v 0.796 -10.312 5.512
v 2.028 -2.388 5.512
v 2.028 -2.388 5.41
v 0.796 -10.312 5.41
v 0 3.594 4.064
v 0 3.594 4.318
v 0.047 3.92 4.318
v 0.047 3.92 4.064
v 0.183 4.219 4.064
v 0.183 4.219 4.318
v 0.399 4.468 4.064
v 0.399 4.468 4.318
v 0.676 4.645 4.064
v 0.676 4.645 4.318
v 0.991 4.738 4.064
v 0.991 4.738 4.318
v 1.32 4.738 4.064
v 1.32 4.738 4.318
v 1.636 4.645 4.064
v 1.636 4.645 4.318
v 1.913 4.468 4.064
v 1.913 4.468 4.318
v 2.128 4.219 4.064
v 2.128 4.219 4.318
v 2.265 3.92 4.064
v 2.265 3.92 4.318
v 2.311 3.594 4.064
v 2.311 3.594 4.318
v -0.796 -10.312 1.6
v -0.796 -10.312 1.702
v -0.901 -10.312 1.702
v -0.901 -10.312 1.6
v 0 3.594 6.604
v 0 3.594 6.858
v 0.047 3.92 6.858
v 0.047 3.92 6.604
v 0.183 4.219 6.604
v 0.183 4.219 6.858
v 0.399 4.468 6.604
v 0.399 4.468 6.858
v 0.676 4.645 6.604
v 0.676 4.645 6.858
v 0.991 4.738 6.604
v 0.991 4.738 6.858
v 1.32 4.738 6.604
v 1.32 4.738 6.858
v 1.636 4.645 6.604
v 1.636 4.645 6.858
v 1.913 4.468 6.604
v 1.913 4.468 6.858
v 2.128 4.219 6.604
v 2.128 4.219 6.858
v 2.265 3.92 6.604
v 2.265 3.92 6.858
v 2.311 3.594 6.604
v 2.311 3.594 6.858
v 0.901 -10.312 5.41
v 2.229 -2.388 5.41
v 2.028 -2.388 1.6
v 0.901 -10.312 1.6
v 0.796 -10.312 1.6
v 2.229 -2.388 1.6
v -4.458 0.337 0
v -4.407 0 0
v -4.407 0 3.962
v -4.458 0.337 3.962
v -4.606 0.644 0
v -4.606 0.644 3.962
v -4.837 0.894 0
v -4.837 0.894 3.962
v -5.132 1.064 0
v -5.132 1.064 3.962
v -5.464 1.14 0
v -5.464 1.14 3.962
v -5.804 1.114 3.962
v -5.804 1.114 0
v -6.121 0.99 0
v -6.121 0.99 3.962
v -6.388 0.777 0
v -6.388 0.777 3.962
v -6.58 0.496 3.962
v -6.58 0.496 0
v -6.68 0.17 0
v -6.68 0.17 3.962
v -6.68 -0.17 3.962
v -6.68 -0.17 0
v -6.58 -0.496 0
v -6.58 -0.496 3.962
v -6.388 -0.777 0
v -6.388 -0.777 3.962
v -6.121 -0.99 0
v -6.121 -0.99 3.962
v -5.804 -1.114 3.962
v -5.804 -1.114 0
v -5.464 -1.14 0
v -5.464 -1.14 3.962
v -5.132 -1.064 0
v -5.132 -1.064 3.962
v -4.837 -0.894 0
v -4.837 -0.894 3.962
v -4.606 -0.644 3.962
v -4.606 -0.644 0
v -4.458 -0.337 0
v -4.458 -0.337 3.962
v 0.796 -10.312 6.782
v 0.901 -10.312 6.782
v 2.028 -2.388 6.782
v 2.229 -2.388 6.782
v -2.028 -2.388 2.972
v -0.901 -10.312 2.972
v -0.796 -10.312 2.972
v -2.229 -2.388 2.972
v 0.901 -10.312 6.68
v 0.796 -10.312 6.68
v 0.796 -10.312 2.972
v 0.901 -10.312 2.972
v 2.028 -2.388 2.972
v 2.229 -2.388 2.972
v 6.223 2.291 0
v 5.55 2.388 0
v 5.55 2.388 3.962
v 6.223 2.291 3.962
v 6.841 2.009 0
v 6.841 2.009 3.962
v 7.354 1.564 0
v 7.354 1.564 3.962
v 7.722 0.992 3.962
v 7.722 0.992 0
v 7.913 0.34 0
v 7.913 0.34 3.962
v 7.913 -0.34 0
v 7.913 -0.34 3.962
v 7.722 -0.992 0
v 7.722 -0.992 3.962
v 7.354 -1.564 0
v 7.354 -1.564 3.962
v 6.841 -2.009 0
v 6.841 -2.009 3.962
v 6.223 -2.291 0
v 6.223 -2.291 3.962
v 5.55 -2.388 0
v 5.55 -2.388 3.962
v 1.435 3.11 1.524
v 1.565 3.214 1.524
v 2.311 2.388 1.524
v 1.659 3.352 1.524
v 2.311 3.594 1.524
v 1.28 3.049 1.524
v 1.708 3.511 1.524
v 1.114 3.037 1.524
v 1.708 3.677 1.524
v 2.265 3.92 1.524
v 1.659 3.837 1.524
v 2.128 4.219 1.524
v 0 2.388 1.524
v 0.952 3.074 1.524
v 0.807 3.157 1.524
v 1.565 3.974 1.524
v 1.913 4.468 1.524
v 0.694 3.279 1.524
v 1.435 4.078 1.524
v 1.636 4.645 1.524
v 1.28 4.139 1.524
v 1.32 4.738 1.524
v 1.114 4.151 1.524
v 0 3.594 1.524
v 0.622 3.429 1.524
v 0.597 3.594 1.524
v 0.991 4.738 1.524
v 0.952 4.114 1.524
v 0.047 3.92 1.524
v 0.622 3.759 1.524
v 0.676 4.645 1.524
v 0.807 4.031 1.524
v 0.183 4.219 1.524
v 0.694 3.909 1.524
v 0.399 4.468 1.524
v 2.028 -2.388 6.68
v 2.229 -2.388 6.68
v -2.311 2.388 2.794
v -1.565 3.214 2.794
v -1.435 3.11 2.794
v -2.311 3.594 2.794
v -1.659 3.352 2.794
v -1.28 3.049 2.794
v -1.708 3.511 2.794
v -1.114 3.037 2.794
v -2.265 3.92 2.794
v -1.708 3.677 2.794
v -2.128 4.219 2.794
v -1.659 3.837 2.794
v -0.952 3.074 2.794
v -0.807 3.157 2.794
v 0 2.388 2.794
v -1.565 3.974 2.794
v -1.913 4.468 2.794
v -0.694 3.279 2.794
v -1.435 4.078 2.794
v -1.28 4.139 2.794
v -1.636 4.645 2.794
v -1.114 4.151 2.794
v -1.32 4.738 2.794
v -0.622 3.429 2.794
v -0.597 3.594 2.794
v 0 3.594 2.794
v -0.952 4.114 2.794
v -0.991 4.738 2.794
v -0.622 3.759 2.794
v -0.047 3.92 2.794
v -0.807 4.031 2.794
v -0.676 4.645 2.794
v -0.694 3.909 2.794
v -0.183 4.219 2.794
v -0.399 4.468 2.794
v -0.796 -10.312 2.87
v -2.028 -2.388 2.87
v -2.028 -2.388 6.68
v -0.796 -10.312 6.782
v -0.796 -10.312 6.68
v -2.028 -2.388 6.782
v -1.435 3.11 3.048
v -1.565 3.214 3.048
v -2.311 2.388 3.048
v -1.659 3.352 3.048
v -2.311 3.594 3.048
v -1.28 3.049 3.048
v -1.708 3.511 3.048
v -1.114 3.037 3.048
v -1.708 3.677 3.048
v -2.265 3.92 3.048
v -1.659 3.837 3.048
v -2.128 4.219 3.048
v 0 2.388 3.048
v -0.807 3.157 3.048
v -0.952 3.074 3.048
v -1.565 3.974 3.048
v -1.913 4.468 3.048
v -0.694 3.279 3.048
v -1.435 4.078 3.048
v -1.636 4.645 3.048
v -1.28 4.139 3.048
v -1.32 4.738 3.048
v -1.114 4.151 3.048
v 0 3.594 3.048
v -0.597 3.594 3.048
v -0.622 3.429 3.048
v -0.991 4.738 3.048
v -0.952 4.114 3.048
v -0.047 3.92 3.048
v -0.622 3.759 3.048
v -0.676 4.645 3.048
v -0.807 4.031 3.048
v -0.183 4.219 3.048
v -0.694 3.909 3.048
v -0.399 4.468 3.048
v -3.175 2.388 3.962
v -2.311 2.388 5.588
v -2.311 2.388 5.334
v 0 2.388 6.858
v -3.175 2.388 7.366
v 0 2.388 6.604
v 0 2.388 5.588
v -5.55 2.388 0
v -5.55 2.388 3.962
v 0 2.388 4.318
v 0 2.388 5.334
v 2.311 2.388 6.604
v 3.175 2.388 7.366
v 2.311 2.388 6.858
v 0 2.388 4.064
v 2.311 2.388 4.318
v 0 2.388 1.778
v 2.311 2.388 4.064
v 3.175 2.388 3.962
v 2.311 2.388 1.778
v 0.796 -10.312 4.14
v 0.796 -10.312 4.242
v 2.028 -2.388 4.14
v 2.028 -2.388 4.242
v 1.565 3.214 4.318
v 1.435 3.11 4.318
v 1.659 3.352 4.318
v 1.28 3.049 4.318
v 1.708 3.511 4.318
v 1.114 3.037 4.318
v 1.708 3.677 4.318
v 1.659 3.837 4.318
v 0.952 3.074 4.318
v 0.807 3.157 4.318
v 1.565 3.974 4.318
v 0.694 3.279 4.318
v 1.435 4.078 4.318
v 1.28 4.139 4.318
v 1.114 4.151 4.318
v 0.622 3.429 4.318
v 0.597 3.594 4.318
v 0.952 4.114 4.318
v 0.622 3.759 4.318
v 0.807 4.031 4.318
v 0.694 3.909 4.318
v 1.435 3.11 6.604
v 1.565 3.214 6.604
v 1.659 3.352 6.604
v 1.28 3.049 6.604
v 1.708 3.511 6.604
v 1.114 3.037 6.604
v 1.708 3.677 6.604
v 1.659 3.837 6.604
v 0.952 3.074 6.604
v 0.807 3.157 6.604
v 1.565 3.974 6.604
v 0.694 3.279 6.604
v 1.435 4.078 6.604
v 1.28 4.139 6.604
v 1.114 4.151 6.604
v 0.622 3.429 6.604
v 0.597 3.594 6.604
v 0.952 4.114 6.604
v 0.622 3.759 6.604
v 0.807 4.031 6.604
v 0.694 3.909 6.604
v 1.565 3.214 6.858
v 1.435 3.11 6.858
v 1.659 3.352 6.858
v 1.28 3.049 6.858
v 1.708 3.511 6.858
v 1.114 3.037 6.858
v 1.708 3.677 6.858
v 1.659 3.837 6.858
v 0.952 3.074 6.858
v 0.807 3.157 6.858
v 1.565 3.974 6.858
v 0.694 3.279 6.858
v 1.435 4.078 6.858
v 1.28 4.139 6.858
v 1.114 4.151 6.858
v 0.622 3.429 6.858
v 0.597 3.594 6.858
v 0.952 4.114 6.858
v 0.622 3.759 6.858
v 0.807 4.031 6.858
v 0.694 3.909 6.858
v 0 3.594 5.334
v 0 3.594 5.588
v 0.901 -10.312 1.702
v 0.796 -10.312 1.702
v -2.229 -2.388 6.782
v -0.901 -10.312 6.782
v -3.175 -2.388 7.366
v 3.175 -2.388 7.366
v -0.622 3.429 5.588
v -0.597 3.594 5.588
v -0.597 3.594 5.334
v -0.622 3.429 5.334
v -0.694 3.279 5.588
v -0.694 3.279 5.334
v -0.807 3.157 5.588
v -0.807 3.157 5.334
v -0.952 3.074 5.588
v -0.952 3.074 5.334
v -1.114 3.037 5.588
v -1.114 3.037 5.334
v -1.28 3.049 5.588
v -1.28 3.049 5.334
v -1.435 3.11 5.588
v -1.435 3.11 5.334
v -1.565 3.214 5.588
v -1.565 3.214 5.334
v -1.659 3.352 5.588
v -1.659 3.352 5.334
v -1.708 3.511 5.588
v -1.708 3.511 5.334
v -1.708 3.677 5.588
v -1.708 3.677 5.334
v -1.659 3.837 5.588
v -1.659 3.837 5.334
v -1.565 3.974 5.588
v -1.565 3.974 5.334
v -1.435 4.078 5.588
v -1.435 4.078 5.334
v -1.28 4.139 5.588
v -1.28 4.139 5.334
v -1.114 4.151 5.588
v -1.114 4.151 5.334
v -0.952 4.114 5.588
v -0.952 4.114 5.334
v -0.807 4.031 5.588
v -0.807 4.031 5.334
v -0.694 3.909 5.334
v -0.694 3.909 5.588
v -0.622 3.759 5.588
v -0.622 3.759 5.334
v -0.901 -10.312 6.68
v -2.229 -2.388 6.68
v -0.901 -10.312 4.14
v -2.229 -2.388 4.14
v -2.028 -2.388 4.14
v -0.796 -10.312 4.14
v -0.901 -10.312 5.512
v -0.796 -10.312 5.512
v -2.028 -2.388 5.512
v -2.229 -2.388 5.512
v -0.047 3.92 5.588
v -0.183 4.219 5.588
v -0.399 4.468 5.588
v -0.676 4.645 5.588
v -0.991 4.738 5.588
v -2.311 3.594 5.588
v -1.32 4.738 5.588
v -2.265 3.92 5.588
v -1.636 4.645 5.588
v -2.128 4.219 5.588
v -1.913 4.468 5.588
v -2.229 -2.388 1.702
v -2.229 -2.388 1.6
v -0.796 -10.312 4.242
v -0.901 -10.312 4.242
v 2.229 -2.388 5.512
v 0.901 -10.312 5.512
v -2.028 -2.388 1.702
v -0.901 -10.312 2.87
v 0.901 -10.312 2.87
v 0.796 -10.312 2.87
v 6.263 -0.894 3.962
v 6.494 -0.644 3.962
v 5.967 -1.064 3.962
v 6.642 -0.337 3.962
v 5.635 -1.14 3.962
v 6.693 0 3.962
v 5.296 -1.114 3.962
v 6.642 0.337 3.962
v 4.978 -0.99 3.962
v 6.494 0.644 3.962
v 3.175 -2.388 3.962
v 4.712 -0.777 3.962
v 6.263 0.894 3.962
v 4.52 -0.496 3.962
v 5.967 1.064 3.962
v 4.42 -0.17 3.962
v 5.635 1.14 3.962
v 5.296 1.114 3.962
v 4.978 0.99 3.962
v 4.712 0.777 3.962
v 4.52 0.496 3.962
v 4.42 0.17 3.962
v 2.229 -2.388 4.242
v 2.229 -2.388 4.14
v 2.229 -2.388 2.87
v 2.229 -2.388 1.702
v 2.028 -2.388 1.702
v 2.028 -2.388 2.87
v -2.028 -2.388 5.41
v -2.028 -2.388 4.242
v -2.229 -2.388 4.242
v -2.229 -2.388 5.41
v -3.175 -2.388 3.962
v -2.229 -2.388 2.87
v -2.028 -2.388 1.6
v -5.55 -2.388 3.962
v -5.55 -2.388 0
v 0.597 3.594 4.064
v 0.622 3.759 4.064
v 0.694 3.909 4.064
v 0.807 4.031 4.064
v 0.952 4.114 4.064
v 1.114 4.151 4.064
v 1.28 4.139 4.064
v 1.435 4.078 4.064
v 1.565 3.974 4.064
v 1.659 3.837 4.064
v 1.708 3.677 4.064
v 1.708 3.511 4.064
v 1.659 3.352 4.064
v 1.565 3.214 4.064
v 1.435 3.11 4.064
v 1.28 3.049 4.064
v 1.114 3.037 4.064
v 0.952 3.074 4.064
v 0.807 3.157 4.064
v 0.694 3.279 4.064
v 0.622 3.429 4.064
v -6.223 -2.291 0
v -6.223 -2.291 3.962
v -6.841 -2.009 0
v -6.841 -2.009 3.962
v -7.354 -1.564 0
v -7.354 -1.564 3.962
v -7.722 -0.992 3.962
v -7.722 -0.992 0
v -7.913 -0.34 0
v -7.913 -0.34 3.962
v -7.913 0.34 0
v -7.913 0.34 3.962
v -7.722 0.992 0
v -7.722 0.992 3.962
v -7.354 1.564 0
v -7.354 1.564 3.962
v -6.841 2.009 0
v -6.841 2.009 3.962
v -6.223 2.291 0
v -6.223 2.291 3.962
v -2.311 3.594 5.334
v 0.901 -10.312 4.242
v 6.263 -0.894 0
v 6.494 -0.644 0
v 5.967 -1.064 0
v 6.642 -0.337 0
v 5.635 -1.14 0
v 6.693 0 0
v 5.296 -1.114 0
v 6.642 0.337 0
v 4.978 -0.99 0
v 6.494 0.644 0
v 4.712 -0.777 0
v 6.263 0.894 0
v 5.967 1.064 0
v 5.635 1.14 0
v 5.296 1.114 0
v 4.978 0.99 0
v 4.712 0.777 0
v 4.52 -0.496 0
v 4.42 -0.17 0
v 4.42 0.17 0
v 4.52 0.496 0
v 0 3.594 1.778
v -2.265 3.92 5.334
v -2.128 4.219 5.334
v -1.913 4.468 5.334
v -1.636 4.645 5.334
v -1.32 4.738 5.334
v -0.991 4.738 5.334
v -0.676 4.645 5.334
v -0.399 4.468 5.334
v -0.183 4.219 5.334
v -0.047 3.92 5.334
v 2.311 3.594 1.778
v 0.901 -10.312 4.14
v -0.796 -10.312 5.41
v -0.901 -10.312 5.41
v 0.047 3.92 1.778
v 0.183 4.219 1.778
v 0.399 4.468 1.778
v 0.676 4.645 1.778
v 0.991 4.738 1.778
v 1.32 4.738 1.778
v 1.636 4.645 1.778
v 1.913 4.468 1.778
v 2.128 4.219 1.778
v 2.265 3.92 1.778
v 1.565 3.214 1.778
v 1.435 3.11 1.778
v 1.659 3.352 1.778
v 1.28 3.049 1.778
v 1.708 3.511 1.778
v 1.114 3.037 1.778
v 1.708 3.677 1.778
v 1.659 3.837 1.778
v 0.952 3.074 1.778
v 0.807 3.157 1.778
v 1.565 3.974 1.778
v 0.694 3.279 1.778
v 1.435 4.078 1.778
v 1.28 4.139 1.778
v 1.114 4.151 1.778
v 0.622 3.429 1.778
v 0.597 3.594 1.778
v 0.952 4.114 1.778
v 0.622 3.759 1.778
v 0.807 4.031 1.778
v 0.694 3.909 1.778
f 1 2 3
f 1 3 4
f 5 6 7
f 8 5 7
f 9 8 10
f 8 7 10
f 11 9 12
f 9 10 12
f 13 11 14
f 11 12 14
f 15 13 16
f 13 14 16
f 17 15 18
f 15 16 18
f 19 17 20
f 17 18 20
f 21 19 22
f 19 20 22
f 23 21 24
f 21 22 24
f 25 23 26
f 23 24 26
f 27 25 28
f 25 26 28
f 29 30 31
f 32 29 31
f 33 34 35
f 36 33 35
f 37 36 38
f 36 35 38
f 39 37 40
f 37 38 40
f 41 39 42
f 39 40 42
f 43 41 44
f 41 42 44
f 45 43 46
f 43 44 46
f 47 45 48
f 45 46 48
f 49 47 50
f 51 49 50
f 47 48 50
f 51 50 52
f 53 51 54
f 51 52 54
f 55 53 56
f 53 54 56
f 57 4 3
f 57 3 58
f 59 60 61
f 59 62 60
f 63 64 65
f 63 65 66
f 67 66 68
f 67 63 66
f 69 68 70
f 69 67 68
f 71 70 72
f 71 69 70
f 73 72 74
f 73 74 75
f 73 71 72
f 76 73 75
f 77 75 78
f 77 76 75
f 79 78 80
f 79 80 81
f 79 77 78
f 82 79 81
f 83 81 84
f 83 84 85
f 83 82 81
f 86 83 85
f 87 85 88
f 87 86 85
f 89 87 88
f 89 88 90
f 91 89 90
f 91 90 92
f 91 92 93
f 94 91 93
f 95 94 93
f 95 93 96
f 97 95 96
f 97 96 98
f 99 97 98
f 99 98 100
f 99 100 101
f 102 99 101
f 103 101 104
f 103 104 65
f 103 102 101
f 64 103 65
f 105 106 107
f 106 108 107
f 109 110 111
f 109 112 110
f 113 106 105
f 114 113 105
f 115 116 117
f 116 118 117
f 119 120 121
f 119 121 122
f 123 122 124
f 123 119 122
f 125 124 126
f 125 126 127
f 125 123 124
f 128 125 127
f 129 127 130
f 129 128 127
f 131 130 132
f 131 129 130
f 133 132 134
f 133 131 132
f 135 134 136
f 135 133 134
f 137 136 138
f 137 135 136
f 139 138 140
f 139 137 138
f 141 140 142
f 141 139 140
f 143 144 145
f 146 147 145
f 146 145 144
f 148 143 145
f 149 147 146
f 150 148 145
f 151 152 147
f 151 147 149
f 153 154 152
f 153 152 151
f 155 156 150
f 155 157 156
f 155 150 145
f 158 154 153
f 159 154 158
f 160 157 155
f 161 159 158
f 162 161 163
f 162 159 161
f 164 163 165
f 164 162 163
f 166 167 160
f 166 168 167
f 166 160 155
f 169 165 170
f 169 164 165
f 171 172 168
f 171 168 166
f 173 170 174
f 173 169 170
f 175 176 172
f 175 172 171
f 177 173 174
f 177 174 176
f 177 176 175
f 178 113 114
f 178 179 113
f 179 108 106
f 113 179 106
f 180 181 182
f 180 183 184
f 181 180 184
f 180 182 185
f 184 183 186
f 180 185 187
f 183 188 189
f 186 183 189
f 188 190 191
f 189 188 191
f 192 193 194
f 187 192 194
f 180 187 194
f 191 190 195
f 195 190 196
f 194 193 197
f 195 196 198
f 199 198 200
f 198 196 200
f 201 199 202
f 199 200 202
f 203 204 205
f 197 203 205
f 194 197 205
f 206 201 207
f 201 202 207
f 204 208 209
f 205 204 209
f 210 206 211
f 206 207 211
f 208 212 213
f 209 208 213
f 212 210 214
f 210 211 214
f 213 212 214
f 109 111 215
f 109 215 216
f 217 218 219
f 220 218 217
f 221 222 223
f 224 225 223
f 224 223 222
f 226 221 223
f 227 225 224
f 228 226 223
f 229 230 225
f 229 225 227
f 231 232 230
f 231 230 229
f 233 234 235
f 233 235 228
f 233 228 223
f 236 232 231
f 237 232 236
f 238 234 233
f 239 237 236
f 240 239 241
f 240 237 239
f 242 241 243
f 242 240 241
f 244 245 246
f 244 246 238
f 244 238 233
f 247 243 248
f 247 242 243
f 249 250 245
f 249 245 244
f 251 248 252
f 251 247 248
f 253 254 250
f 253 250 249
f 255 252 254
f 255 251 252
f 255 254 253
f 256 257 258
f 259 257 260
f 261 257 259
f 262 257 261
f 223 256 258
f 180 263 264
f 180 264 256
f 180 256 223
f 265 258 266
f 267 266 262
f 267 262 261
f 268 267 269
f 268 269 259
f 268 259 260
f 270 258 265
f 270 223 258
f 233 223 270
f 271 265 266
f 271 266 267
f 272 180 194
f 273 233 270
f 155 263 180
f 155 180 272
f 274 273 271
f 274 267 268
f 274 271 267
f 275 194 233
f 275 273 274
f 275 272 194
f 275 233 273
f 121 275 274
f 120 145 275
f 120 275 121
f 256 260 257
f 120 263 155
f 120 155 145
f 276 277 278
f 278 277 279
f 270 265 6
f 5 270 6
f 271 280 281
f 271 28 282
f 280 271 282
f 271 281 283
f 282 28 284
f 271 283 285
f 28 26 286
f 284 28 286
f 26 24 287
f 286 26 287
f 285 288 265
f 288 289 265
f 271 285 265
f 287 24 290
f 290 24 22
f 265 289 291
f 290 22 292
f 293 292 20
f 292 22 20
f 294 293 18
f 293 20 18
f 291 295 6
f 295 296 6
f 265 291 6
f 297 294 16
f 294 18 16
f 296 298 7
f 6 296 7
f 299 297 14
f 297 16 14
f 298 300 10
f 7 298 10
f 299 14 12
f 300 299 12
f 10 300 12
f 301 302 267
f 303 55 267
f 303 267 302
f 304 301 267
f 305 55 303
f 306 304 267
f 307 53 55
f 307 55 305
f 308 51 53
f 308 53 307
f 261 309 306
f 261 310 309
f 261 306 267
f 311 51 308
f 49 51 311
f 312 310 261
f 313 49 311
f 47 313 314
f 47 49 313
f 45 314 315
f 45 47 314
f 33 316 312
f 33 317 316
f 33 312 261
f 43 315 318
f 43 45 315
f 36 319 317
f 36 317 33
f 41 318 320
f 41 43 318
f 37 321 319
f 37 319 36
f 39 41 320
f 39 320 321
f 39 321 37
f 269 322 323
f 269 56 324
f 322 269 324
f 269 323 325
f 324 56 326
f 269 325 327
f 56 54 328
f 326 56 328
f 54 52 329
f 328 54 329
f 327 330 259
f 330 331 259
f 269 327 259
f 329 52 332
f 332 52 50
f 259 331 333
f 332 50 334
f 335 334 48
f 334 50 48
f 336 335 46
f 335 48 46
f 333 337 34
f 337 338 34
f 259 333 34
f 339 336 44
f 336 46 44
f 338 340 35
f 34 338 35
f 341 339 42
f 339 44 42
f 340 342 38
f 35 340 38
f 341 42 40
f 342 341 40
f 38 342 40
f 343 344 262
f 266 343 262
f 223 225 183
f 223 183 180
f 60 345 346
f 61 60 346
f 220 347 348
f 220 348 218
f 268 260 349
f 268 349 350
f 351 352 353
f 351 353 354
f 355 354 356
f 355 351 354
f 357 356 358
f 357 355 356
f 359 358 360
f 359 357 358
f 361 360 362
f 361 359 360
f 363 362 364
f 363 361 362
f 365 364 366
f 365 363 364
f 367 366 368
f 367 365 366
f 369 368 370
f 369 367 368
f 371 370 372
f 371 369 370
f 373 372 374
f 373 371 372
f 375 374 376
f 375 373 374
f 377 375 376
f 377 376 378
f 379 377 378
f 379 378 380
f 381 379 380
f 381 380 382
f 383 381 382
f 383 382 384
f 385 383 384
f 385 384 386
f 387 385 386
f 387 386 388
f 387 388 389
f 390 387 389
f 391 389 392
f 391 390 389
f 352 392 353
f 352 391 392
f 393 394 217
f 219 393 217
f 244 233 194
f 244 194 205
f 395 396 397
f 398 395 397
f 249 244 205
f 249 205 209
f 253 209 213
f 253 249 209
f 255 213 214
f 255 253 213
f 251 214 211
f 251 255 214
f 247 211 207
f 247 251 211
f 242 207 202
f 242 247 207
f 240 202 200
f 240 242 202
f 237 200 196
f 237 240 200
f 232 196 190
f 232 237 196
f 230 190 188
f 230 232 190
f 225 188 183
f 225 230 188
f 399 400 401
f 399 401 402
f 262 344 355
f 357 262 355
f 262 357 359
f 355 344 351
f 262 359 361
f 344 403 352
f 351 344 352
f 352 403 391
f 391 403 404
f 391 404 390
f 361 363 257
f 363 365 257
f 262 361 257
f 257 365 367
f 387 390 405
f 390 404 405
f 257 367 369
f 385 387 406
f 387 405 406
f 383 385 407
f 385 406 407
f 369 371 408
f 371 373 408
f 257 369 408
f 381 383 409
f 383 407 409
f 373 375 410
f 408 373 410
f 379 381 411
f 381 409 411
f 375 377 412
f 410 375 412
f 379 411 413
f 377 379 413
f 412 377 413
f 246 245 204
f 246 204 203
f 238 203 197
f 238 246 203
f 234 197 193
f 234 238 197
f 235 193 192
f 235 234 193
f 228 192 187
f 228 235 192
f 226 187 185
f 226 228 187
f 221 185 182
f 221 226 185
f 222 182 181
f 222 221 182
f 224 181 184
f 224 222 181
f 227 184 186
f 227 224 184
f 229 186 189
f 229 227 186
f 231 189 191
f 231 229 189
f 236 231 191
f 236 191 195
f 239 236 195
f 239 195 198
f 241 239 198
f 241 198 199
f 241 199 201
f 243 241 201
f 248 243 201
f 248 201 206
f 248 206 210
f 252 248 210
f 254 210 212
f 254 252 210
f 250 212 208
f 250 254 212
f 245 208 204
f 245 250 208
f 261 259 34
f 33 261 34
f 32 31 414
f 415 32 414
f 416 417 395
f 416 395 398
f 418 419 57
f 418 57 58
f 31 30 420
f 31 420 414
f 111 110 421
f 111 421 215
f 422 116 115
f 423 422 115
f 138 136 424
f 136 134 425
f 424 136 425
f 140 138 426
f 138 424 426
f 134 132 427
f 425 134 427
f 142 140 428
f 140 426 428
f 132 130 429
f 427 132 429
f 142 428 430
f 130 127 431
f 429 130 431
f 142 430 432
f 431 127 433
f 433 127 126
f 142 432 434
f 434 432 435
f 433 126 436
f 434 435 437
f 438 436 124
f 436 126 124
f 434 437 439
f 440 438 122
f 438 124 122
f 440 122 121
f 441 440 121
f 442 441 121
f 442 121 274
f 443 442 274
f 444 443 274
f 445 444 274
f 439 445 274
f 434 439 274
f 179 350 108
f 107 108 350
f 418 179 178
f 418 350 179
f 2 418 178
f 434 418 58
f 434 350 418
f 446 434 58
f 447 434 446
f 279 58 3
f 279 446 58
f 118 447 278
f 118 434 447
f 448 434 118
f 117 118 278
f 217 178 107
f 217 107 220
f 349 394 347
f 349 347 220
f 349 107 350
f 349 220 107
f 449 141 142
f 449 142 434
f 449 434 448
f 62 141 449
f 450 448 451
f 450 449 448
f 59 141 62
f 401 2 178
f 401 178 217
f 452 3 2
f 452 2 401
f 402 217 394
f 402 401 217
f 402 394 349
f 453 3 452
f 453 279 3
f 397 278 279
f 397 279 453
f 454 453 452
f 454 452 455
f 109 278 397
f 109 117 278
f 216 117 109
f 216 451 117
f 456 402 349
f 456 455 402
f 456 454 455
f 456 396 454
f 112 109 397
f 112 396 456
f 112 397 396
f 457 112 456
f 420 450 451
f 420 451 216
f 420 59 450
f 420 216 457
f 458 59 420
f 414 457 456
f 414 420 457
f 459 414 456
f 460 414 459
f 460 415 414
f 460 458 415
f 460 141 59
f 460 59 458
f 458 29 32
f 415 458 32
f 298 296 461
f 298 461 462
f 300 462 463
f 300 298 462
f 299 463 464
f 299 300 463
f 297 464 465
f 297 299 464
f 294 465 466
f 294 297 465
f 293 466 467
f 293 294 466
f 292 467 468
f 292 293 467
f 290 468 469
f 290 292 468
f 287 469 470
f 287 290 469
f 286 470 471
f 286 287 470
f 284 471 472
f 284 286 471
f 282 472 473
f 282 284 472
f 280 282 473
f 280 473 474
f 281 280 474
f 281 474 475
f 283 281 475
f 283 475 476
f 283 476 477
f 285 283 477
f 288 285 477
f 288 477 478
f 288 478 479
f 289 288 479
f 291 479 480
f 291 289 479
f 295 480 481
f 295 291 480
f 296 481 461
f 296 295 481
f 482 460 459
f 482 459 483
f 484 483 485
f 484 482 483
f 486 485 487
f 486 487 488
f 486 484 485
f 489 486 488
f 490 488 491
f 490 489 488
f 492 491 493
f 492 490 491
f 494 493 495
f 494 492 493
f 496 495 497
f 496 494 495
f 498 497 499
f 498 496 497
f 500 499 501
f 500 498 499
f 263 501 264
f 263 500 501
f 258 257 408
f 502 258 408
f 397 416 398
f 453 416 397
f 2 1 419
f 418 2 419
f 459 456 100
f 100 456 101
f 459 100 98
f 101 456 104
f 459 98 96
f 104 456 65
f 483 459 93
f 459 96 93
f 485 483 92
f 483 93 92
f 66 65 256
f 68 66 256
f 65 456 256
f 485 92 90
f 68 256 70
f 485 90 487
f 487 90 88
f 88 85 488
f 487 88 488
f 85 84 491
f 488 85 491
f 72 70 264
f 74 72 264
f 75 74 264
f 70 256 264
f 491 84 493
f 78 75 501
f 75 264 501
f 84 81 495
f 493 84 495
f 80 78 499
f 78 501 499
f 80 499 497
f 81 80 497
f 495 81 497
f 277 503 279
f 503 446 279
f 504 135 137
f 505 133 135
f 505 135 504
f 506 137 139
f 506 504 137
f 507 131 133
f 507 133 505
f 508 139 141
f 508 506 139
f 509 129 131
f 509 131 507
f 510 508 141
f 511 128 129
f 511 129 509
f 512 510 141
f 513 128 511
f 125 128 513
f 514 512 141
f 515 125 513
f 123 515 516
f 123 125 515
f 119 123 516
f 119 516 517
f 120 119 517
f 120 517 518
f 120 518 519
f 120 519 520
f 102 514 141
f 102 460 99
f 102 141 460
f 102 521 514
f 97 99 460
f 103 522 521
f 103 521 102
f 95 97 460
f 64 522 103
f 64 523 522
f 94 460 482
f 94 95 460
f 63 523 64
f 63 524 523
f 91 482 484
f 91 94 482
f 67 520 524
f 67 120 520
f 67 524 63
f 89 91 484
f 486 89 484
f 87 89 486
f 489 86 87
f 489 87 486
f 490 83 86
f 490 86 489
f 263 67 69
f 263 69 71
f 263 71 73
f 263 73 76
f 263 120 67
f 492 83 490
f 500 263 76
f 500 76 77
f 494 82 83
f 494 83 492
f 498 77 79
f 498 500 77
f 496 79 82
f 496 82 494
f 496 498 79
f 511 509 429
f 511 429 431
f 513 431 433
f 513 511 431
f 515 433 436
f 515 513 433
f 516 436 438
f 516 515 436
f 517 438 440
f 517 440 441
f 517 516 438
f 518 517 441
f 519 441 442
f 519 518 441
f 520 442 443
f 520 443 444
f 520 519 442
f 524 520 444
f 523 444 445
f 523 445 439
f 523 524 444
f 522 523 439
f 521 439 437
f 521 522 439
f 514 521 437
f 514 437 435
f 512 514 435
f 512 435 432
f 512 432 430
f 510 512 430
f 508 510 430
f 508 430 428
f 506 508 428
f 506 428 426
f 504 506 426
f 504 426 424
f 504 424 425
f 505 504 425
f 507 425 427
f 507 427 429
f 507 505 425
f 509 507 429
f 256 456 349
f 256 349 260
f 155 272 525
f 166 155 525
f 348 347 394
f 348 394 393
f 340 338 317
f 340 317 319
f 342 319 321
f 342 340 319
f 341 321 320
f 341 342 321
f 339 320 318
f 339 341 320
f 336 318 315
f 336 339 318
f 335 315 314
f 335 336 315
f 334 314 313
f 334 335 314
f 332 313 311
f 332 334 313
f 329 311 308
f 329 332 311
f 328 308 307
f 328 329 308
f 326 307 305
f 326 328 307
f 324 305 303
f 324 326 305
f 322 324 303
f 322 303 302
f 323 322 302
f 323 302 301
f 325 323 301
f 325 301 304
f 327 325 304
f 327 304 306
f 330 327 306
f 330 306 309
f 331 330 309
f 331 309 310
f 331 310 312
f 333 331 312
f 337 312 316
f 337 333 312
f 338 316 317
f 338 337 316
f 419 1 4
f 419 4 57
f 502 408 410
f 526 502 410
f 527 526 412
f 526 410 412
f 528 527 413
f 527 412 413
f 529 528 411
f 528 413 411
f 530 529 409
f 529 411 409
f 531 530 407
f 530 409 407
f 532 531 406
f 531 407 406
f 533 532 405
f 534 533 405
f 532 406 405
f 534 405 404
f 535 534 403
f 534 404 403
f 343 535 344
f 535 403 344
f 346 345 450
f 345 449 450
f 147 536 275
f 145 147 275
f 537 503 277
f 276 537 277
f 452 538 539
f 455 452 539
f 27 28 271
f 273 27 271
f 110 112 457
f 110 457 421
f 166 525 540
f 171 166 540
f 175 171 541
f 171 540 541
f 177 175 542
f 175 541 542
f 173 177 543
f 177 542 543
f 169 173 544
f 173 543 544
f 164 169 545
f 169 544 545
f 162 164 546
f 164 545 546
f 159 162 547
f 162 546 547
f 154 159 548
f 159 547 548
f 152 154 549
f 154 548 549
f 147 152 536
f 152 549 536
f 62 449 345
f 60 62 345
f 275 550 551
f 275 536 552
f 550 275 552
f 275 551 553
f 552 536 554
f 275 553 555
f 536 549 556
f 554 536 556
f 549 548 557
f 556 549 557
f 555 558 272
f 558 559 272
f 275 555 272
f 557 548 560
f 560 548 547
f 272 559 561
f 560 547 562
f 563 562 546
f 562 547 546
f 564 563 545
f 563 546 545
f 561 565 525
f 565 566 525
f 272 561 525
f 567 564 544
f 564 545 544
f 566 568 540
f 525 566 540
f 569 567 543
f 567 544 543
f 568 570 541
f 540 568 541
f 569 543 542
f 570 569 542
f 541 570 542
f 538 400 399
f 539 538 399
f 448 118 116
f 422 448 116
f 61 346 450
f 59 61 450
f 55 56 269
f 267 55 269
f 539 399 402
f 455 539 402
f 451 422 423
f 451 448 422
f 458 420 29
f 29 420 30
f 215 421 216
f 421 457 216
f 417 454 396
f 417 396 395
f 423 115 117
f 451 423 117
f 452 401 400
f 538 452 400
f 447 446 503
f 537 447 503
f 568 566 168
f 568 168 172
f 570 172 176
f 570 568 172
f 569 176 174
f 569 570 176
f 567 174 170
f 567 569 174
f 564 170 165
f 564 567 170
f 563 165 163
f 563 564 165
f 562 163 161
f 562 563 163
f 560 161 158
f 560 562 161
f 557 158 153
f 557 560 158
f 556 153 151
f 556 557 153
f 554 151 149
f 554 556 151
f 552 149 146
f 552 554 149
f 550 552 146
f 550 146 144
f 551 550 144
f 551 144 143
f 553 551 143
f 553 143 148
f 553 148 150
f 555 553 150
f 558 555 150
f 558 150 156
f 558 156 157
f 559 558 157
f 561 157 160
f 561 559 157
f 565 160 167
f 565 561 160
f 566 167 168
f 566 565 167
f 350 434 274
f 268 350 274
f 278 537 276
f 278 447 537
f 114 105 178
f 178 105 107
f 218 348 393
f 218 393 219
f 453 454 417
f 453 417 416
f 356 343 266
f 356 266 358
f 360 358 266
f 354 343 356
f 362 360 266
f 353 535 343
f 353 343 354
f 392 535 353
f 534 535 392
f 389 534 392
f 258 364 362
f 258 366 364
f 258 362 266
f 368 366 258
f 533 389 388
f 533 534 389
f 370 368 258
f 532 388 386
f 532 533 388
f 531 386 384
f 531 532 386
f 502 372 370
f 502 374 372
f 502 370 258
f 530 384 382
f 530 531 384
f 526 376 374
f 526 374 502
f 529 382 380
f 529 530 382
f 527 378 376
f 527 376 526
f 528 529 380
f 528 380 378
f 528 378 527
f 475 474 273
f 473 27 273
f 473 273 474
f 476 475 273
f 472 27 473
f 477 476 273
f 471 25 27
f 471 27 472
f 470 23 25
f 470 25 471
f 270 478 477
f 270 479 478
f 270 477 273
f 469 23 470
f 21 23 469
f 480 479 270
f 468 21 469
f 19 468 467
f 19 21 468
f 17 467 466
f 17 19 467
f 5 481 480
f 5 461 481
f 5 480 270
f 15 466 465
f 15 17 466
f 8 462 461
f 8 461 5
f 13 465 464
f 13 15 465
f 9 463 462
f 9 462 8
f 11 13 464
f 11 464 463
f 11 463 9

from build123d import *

# Parameters (mm, degrees)
SKETCH1_R                 = 1.143
BOSS_EXTRUDE1_DEPTH       = 3.9624
SKETCH2_W                 = 6.35
SKETCH2_H                 = 4.7752
BOSS_EXTRUDE2_DEPTH       = 3.4036
BOSS_EXTRUDE3_DEPTH       = 0.127
BOSS_EXTRUDE3_DEPTH_BACK  = 0.127
SKETCH3_R                 = 0.5588
BOSS_EXTRUDE4_DEPTH       = 0.127
BOSS_EXTRUDE4_DEPTH_BACK  = 0.127
SKETCH4_R                 = 0.5588
BOSS_EXTRUDE5_DEPTH       = 0.127
BOSS_EXTRUDE5_DEPTH_BACK  = 0.127
SKETCH5_R                 = 0.5588
BOSS_EXTRUDE6_DEPTH       = 0.127
BOSS_EXTRUDE6_DEPTH_BACK  = 0.127
SKETCH7_R                 = 0.5588
BOSS_EXTRUDE7_DEPTH       = 0.127
BOSS_EXTRUDE7_DEPTH_BACK  = 0.127
SKETCH6_R                 = 0.5588
BOSS_EXTRUDE8_DEPTH       = 0.0508
BOSS_EXTRUDE8_DEPTH_BACK  = 0.0508
BOSS_EXTRUDE11_DEPTH      = 0.0508
BOSS_EXTRUDE11_DEPTH_BACK = 0.0508
BOSS_EXTRUDE12_DEPTH      = 0.0508
BOSS_EXTRUDE12_DEPTH_BACK = 0.0508
BOSS_EXTRUDE13_DEPTH      = 0.0508
BOSS_EXTRUDE13_DEPTH_BACK = 0.0508
BOSS_EXTRUDE14_DEPTH      = 0.0508
BOSS_EXTRUDE14_DEPTH_BACK = 0.0508


with BuildPart() as part:
    # Sketch1 → Boss-Extrude1 (new body)
    with BuildSketch(Plane.XY):
        with BuildLine():
            Line((-5.5499, 2.3876), (5.5499, 2.3876))
            ThreePointArc((5.5499, 2.3876), (7.9375, 0), (5.5499, -2.3876))
            Line((5.5499, -2.3876), (-5.5499, -2.3876))
            ThreePointArc((-5.5499, -2.3876), (-7.9375, 0), (-5.5499, 2.3876))
        make_face()
        with Locations((-5.5499, 0)):
            Circle(SKETCH1_R, mode=Mode.SUBTRACT)
        with Locations((5.5499, 0)):
            Circle(SKETCH1_R, mode=Mode.SUBTRACT)
    extrude(amount=BOSS_EXTRUDE1_DEPTH)

    # Sketch2 → Boss-Extrude2 (add)
    with BuildSketch(Plane.XY.offset(3.9624)):
        Rectangle(SKETCH2_W, SKETCH2_H)
    extrude(amount=BOSS_EXTRUDE2_DEPTH)

    # Sketch3 → Boss-Extrude3 (add, two sides: drawn at the far end of the back side and taken through both)
    with BuildSketch(Plane(origin=(0, 0, 1.651), x_dir=(-1, 0, 0), z_dir=(0, 0, -1)).offset(-BOSS_EXTRUDE3_DEPTH_BACK)):
        with BuildLine():
            Line((-2.3114, 3.5941), (-2.3114, 2.3876))
            Line((-2.3114, 2.3876), (0, 2.3876))
            Line((0, 2.3876), (0, 3.5941))
            ThreePointArc((0, 3.5941), (-1.1557, 4.7498), (-2.3114, 3.5941))
        make_face()
        with Locations((-1.1557, 3.5941)):
            Circle(SKETCH3_R, mode=Mode.SUBTRACT)
    extrude(amount=BOSS_EXTRUDE3_DEPTH + BOSS_EXTRUDE3_DEPTH_BACK)

    # Sketch4 → Boss-Extrude4 (add, two sides: drawn at the far end of the back side and taken through both)
    with BuildSketch(Plane(origin=(0, 0, 2.921), x_dir=(-1, 0, 0), z_dir=(0, 0, -1)).offset(-BOSS_EXTRUDE4_DEPTH_BACK)):
        with BuildLine():
            Line((2.3114, 3.5941), (2.3114, 2.3876))
            Line((2.3114, 2.3876), (0, 2.3876))
            Line((0, 2.3876), (0, 3.5941))
            ThreePointArc((0, 3.5941), (1.1557, 4.7498), (2.3114, 3.5941))
        make_face()
        with Locations(Location((1.1557, 3.5941, 0), (0, 0, 180))):
            Circle(SKETCH4_R, mode=Mode.SUBTRACT)
    extrude(amount=BOSS_EXTRUDE4_DEPTH + BOSS_EXTRUDE4_DEPTH_BACK)

    # Sketch5 → Boss-Extrude5 (add, two sides: drawn at the far end of the back side and taken through both)
    with BuildSketch(Plane(origin=(0, 0, 4.191), x_dir=(-1, 0, 0), z_dir=(0, 0, -1)).offset(-BOSS_EXTRUDE5_DEPTH_BACK)):
        with BuildLine():
            Line((-2.3114, 3.5941), (-2.3114, 2.3876))
            Line((-2.3114, 2.3876), (0, 2.3876))
            Line((0, 2.3876), (0, 3.5941))
            ThreePointArc((0, 3.5941), (-1.1557, 4.7498), (-2.3114, 3.5941))
        make_face()
        with Locations((-1.1557, 3.5941)):
            Circle(SKETCH5_R, mode=Mode.SUBTRACT)
    extrude(amount=BOSS_EXTRUDE5_DEPTH + BOSS_EXTRUDE5_DEPTH_BACK)

    # Sketch7 → Boss-Extrude6 (add, two sides: drawn at the far end of the back side and taken through both)
    with BuildSketch(Plane(origin=(0, 0, 5.461), x_dir=(-1, 0, 0), z_dir=(0, 0, -1)).offset(-BOSS_EXTRUDE6_DEPTH_BACK)):
        with BuildLine():
            Line((2.3114, 2.3876), (2.3114, 3.5941))
            ThreePointArc((2.3114, 3.5941), (1.1557, 4.7498), (0, 3.5941))
            Line((0, 3.5941), (0, 2.3876))
            Line((0, 2.3876), (2.3114, 2.3876))
        make_face()
        with Locations(Location((1.1557, 3.5941, 0), (0, 0, 180))):
            Circle(SKETCH7_R, mode=Mode.SUBTRACT)
    extrude(amount=BOSS_EXTRUDE6_DEPTH + BOSS_EXTRUDE6_DEPTH_BACK)

    # Sketch6 → Boss-Extrude7 (add, two sides: drawn at the far end of the back side and taken through both)
    with BuildSketch(Plane(origin=(0, 0, 6.731), x_dir=(-1, 0, 0), z_dir=(0, 0, -1)).offset(-BOSS_EXTRUDE7_DEPTH_BACK)):
        with BuildLine():
            Line((-2.3114, 3.5941), (-2.3114, 2.3876))
            Line((-2.3114, 2.3876), (0, 2.3876))
            Line((0, 2.3876), (0, 3.5941))
            ThreePointArc((0, 3.5941), (-1.1557, 4.7498), (-2.3114, 3.5941))
        make_face()
        with Locations((-1.1557, 3.5941)):
            Circle(SKETCH6_R, mode=Mode.SUBTRACT)
    extrude(amount=BOSS_EXTRUDE7_DEPTH + BOSS_EXTRUDE7_DEPTH_BACK)

    # Sketch8 → Boss-Extrude8 (add, two sides: drawn at the far end of the back side and taken through both)
    with BuildSketch(Plane(origin=(0, 0, 1.651), x_dir=(-1, 0, 0), z_dir=(0, 0, -1)).offset(-BOSS_EXTRUDE8_DEPTH_BACK)):
        Polygon((2.228681211, -2.3876), (2.028101851, -2.3876), (0.796265448, -10.3124), (0.900870757, -10.3124), align=None)
        Polygon((-0.900870757, -10.3124), (-0.796265448, -10.3124), (-2.028101851, -2.3876), (-2.228681211, -2.3876), align=None)
    extrude(amount=BOSS_EXTRUDE8_DEPTH + BOSS_EXTRUDE8_DEPTH_BACK)

    # Sketch11 → Boss-Extrude11 (add, two sides: drawn at the far end of the back side and taken through both)
    with BuildSketch(Plane(origin=(0, 0, 4.191), x_dir=(-1, 0, 0), z_dir=(0, 0, -1)).offset(-BOSS_EXTRUDE11_DEPTH_BACK)):
        Polygon((2.228681211, -2.3876), (0.900870757, -10.3124), (0.796265448, -10.3124), (2.028101851, -2.3876), align=None)
        Polygon((-0.900870757, -10.3124), (-0.796265448, -10.3124), (-2.028101851, -2.3876), (-2.228681211, -2.3876), align=None)
    extrude(amount=BOSS_EXTRUDE11_DEPTH + BOSS_EXTRUDE11_DEPTH_BACK)

    # Sketch12 → Boss-Extrude12 (add, two sides: drawn at the far end of the back side and taken through both)
    with BuildSketch(Plane(origin=(0, 0, 6.731), x_dir=(-1, 0, 0), z_dir=(0, 0, -1)).offset(-BOSS_EXTRUDE12_DEPTH_BACK)):
        Polygon((2.228681211, -2.3876), (0.900870757, -10.3124), (0.796265448, -10.3124), (2.028101851, -2.3876), align=None)
        Polygon((-0.900870757, -10.3124), (-0.796265448, -10.3124), (-2.028101851, -2.3876), (-2.228681211, -2.3876), align=None)
    extrude(amount=BOSS_EXTRUDE12_DEPTH + BOSS_EXTRUDE12_DEPTH_BACK)

    # Sketch13 → Boss-Extrude13 (add, two sides: drawn at the far end of the back side and taken through both)
    with BuildSketch(Plane(origin=(0, 0, 2.921), x_dir=(-1, 0, 0), z_dir=(0, 0, -1)).offset(-BOSS_EXTRUDE13_DEPTH_BACK)):
        Polygon((0.900870757, -10.3124), (0.796265448, -10.3124), (2.028101851, -2.3876), (2.228681211, -2.3876), align=None)
        Polygon((-0.900870757, -10.3124), (-0.796265448, -10.3124), (-2.028101851, -2.3876), (-2.228681211, -2.3876), align=None)
    extrude(amount=BOSS_EXTRUDE13_DEPTH + BOSS_EXTRUDE13_DEPTH_BACK)

    # Sketch15 → Boss-Extrude14 (add, two sides: drawn at the far end of the back side and taken through both)
    with BuildSketch(Plane(origin=(0, 0, 5.461), x_dir=(-1, 0, 0), z_dir=(0, 0, -1)).offset(-BOSS_EXTRUDE14_DEPTH_BACK)):
        Polygon((-0.900870757, -10.3124), (-2.228681211, -2.3876), (-2.028101851, -2.3876), (-0.796265448, -10.3124), align=None)
        Polygon((0.796265448, -10.3124), (0.900870757, -10.3124), (2.228681211, -2.3876), (2.028101851, -2.3876), align=None)
    extrude(amount=BOSS_EXTRUDE14_DEPTH + BOSS_EXTRUDE14_DEPTH_BACK)


solid = part.part
